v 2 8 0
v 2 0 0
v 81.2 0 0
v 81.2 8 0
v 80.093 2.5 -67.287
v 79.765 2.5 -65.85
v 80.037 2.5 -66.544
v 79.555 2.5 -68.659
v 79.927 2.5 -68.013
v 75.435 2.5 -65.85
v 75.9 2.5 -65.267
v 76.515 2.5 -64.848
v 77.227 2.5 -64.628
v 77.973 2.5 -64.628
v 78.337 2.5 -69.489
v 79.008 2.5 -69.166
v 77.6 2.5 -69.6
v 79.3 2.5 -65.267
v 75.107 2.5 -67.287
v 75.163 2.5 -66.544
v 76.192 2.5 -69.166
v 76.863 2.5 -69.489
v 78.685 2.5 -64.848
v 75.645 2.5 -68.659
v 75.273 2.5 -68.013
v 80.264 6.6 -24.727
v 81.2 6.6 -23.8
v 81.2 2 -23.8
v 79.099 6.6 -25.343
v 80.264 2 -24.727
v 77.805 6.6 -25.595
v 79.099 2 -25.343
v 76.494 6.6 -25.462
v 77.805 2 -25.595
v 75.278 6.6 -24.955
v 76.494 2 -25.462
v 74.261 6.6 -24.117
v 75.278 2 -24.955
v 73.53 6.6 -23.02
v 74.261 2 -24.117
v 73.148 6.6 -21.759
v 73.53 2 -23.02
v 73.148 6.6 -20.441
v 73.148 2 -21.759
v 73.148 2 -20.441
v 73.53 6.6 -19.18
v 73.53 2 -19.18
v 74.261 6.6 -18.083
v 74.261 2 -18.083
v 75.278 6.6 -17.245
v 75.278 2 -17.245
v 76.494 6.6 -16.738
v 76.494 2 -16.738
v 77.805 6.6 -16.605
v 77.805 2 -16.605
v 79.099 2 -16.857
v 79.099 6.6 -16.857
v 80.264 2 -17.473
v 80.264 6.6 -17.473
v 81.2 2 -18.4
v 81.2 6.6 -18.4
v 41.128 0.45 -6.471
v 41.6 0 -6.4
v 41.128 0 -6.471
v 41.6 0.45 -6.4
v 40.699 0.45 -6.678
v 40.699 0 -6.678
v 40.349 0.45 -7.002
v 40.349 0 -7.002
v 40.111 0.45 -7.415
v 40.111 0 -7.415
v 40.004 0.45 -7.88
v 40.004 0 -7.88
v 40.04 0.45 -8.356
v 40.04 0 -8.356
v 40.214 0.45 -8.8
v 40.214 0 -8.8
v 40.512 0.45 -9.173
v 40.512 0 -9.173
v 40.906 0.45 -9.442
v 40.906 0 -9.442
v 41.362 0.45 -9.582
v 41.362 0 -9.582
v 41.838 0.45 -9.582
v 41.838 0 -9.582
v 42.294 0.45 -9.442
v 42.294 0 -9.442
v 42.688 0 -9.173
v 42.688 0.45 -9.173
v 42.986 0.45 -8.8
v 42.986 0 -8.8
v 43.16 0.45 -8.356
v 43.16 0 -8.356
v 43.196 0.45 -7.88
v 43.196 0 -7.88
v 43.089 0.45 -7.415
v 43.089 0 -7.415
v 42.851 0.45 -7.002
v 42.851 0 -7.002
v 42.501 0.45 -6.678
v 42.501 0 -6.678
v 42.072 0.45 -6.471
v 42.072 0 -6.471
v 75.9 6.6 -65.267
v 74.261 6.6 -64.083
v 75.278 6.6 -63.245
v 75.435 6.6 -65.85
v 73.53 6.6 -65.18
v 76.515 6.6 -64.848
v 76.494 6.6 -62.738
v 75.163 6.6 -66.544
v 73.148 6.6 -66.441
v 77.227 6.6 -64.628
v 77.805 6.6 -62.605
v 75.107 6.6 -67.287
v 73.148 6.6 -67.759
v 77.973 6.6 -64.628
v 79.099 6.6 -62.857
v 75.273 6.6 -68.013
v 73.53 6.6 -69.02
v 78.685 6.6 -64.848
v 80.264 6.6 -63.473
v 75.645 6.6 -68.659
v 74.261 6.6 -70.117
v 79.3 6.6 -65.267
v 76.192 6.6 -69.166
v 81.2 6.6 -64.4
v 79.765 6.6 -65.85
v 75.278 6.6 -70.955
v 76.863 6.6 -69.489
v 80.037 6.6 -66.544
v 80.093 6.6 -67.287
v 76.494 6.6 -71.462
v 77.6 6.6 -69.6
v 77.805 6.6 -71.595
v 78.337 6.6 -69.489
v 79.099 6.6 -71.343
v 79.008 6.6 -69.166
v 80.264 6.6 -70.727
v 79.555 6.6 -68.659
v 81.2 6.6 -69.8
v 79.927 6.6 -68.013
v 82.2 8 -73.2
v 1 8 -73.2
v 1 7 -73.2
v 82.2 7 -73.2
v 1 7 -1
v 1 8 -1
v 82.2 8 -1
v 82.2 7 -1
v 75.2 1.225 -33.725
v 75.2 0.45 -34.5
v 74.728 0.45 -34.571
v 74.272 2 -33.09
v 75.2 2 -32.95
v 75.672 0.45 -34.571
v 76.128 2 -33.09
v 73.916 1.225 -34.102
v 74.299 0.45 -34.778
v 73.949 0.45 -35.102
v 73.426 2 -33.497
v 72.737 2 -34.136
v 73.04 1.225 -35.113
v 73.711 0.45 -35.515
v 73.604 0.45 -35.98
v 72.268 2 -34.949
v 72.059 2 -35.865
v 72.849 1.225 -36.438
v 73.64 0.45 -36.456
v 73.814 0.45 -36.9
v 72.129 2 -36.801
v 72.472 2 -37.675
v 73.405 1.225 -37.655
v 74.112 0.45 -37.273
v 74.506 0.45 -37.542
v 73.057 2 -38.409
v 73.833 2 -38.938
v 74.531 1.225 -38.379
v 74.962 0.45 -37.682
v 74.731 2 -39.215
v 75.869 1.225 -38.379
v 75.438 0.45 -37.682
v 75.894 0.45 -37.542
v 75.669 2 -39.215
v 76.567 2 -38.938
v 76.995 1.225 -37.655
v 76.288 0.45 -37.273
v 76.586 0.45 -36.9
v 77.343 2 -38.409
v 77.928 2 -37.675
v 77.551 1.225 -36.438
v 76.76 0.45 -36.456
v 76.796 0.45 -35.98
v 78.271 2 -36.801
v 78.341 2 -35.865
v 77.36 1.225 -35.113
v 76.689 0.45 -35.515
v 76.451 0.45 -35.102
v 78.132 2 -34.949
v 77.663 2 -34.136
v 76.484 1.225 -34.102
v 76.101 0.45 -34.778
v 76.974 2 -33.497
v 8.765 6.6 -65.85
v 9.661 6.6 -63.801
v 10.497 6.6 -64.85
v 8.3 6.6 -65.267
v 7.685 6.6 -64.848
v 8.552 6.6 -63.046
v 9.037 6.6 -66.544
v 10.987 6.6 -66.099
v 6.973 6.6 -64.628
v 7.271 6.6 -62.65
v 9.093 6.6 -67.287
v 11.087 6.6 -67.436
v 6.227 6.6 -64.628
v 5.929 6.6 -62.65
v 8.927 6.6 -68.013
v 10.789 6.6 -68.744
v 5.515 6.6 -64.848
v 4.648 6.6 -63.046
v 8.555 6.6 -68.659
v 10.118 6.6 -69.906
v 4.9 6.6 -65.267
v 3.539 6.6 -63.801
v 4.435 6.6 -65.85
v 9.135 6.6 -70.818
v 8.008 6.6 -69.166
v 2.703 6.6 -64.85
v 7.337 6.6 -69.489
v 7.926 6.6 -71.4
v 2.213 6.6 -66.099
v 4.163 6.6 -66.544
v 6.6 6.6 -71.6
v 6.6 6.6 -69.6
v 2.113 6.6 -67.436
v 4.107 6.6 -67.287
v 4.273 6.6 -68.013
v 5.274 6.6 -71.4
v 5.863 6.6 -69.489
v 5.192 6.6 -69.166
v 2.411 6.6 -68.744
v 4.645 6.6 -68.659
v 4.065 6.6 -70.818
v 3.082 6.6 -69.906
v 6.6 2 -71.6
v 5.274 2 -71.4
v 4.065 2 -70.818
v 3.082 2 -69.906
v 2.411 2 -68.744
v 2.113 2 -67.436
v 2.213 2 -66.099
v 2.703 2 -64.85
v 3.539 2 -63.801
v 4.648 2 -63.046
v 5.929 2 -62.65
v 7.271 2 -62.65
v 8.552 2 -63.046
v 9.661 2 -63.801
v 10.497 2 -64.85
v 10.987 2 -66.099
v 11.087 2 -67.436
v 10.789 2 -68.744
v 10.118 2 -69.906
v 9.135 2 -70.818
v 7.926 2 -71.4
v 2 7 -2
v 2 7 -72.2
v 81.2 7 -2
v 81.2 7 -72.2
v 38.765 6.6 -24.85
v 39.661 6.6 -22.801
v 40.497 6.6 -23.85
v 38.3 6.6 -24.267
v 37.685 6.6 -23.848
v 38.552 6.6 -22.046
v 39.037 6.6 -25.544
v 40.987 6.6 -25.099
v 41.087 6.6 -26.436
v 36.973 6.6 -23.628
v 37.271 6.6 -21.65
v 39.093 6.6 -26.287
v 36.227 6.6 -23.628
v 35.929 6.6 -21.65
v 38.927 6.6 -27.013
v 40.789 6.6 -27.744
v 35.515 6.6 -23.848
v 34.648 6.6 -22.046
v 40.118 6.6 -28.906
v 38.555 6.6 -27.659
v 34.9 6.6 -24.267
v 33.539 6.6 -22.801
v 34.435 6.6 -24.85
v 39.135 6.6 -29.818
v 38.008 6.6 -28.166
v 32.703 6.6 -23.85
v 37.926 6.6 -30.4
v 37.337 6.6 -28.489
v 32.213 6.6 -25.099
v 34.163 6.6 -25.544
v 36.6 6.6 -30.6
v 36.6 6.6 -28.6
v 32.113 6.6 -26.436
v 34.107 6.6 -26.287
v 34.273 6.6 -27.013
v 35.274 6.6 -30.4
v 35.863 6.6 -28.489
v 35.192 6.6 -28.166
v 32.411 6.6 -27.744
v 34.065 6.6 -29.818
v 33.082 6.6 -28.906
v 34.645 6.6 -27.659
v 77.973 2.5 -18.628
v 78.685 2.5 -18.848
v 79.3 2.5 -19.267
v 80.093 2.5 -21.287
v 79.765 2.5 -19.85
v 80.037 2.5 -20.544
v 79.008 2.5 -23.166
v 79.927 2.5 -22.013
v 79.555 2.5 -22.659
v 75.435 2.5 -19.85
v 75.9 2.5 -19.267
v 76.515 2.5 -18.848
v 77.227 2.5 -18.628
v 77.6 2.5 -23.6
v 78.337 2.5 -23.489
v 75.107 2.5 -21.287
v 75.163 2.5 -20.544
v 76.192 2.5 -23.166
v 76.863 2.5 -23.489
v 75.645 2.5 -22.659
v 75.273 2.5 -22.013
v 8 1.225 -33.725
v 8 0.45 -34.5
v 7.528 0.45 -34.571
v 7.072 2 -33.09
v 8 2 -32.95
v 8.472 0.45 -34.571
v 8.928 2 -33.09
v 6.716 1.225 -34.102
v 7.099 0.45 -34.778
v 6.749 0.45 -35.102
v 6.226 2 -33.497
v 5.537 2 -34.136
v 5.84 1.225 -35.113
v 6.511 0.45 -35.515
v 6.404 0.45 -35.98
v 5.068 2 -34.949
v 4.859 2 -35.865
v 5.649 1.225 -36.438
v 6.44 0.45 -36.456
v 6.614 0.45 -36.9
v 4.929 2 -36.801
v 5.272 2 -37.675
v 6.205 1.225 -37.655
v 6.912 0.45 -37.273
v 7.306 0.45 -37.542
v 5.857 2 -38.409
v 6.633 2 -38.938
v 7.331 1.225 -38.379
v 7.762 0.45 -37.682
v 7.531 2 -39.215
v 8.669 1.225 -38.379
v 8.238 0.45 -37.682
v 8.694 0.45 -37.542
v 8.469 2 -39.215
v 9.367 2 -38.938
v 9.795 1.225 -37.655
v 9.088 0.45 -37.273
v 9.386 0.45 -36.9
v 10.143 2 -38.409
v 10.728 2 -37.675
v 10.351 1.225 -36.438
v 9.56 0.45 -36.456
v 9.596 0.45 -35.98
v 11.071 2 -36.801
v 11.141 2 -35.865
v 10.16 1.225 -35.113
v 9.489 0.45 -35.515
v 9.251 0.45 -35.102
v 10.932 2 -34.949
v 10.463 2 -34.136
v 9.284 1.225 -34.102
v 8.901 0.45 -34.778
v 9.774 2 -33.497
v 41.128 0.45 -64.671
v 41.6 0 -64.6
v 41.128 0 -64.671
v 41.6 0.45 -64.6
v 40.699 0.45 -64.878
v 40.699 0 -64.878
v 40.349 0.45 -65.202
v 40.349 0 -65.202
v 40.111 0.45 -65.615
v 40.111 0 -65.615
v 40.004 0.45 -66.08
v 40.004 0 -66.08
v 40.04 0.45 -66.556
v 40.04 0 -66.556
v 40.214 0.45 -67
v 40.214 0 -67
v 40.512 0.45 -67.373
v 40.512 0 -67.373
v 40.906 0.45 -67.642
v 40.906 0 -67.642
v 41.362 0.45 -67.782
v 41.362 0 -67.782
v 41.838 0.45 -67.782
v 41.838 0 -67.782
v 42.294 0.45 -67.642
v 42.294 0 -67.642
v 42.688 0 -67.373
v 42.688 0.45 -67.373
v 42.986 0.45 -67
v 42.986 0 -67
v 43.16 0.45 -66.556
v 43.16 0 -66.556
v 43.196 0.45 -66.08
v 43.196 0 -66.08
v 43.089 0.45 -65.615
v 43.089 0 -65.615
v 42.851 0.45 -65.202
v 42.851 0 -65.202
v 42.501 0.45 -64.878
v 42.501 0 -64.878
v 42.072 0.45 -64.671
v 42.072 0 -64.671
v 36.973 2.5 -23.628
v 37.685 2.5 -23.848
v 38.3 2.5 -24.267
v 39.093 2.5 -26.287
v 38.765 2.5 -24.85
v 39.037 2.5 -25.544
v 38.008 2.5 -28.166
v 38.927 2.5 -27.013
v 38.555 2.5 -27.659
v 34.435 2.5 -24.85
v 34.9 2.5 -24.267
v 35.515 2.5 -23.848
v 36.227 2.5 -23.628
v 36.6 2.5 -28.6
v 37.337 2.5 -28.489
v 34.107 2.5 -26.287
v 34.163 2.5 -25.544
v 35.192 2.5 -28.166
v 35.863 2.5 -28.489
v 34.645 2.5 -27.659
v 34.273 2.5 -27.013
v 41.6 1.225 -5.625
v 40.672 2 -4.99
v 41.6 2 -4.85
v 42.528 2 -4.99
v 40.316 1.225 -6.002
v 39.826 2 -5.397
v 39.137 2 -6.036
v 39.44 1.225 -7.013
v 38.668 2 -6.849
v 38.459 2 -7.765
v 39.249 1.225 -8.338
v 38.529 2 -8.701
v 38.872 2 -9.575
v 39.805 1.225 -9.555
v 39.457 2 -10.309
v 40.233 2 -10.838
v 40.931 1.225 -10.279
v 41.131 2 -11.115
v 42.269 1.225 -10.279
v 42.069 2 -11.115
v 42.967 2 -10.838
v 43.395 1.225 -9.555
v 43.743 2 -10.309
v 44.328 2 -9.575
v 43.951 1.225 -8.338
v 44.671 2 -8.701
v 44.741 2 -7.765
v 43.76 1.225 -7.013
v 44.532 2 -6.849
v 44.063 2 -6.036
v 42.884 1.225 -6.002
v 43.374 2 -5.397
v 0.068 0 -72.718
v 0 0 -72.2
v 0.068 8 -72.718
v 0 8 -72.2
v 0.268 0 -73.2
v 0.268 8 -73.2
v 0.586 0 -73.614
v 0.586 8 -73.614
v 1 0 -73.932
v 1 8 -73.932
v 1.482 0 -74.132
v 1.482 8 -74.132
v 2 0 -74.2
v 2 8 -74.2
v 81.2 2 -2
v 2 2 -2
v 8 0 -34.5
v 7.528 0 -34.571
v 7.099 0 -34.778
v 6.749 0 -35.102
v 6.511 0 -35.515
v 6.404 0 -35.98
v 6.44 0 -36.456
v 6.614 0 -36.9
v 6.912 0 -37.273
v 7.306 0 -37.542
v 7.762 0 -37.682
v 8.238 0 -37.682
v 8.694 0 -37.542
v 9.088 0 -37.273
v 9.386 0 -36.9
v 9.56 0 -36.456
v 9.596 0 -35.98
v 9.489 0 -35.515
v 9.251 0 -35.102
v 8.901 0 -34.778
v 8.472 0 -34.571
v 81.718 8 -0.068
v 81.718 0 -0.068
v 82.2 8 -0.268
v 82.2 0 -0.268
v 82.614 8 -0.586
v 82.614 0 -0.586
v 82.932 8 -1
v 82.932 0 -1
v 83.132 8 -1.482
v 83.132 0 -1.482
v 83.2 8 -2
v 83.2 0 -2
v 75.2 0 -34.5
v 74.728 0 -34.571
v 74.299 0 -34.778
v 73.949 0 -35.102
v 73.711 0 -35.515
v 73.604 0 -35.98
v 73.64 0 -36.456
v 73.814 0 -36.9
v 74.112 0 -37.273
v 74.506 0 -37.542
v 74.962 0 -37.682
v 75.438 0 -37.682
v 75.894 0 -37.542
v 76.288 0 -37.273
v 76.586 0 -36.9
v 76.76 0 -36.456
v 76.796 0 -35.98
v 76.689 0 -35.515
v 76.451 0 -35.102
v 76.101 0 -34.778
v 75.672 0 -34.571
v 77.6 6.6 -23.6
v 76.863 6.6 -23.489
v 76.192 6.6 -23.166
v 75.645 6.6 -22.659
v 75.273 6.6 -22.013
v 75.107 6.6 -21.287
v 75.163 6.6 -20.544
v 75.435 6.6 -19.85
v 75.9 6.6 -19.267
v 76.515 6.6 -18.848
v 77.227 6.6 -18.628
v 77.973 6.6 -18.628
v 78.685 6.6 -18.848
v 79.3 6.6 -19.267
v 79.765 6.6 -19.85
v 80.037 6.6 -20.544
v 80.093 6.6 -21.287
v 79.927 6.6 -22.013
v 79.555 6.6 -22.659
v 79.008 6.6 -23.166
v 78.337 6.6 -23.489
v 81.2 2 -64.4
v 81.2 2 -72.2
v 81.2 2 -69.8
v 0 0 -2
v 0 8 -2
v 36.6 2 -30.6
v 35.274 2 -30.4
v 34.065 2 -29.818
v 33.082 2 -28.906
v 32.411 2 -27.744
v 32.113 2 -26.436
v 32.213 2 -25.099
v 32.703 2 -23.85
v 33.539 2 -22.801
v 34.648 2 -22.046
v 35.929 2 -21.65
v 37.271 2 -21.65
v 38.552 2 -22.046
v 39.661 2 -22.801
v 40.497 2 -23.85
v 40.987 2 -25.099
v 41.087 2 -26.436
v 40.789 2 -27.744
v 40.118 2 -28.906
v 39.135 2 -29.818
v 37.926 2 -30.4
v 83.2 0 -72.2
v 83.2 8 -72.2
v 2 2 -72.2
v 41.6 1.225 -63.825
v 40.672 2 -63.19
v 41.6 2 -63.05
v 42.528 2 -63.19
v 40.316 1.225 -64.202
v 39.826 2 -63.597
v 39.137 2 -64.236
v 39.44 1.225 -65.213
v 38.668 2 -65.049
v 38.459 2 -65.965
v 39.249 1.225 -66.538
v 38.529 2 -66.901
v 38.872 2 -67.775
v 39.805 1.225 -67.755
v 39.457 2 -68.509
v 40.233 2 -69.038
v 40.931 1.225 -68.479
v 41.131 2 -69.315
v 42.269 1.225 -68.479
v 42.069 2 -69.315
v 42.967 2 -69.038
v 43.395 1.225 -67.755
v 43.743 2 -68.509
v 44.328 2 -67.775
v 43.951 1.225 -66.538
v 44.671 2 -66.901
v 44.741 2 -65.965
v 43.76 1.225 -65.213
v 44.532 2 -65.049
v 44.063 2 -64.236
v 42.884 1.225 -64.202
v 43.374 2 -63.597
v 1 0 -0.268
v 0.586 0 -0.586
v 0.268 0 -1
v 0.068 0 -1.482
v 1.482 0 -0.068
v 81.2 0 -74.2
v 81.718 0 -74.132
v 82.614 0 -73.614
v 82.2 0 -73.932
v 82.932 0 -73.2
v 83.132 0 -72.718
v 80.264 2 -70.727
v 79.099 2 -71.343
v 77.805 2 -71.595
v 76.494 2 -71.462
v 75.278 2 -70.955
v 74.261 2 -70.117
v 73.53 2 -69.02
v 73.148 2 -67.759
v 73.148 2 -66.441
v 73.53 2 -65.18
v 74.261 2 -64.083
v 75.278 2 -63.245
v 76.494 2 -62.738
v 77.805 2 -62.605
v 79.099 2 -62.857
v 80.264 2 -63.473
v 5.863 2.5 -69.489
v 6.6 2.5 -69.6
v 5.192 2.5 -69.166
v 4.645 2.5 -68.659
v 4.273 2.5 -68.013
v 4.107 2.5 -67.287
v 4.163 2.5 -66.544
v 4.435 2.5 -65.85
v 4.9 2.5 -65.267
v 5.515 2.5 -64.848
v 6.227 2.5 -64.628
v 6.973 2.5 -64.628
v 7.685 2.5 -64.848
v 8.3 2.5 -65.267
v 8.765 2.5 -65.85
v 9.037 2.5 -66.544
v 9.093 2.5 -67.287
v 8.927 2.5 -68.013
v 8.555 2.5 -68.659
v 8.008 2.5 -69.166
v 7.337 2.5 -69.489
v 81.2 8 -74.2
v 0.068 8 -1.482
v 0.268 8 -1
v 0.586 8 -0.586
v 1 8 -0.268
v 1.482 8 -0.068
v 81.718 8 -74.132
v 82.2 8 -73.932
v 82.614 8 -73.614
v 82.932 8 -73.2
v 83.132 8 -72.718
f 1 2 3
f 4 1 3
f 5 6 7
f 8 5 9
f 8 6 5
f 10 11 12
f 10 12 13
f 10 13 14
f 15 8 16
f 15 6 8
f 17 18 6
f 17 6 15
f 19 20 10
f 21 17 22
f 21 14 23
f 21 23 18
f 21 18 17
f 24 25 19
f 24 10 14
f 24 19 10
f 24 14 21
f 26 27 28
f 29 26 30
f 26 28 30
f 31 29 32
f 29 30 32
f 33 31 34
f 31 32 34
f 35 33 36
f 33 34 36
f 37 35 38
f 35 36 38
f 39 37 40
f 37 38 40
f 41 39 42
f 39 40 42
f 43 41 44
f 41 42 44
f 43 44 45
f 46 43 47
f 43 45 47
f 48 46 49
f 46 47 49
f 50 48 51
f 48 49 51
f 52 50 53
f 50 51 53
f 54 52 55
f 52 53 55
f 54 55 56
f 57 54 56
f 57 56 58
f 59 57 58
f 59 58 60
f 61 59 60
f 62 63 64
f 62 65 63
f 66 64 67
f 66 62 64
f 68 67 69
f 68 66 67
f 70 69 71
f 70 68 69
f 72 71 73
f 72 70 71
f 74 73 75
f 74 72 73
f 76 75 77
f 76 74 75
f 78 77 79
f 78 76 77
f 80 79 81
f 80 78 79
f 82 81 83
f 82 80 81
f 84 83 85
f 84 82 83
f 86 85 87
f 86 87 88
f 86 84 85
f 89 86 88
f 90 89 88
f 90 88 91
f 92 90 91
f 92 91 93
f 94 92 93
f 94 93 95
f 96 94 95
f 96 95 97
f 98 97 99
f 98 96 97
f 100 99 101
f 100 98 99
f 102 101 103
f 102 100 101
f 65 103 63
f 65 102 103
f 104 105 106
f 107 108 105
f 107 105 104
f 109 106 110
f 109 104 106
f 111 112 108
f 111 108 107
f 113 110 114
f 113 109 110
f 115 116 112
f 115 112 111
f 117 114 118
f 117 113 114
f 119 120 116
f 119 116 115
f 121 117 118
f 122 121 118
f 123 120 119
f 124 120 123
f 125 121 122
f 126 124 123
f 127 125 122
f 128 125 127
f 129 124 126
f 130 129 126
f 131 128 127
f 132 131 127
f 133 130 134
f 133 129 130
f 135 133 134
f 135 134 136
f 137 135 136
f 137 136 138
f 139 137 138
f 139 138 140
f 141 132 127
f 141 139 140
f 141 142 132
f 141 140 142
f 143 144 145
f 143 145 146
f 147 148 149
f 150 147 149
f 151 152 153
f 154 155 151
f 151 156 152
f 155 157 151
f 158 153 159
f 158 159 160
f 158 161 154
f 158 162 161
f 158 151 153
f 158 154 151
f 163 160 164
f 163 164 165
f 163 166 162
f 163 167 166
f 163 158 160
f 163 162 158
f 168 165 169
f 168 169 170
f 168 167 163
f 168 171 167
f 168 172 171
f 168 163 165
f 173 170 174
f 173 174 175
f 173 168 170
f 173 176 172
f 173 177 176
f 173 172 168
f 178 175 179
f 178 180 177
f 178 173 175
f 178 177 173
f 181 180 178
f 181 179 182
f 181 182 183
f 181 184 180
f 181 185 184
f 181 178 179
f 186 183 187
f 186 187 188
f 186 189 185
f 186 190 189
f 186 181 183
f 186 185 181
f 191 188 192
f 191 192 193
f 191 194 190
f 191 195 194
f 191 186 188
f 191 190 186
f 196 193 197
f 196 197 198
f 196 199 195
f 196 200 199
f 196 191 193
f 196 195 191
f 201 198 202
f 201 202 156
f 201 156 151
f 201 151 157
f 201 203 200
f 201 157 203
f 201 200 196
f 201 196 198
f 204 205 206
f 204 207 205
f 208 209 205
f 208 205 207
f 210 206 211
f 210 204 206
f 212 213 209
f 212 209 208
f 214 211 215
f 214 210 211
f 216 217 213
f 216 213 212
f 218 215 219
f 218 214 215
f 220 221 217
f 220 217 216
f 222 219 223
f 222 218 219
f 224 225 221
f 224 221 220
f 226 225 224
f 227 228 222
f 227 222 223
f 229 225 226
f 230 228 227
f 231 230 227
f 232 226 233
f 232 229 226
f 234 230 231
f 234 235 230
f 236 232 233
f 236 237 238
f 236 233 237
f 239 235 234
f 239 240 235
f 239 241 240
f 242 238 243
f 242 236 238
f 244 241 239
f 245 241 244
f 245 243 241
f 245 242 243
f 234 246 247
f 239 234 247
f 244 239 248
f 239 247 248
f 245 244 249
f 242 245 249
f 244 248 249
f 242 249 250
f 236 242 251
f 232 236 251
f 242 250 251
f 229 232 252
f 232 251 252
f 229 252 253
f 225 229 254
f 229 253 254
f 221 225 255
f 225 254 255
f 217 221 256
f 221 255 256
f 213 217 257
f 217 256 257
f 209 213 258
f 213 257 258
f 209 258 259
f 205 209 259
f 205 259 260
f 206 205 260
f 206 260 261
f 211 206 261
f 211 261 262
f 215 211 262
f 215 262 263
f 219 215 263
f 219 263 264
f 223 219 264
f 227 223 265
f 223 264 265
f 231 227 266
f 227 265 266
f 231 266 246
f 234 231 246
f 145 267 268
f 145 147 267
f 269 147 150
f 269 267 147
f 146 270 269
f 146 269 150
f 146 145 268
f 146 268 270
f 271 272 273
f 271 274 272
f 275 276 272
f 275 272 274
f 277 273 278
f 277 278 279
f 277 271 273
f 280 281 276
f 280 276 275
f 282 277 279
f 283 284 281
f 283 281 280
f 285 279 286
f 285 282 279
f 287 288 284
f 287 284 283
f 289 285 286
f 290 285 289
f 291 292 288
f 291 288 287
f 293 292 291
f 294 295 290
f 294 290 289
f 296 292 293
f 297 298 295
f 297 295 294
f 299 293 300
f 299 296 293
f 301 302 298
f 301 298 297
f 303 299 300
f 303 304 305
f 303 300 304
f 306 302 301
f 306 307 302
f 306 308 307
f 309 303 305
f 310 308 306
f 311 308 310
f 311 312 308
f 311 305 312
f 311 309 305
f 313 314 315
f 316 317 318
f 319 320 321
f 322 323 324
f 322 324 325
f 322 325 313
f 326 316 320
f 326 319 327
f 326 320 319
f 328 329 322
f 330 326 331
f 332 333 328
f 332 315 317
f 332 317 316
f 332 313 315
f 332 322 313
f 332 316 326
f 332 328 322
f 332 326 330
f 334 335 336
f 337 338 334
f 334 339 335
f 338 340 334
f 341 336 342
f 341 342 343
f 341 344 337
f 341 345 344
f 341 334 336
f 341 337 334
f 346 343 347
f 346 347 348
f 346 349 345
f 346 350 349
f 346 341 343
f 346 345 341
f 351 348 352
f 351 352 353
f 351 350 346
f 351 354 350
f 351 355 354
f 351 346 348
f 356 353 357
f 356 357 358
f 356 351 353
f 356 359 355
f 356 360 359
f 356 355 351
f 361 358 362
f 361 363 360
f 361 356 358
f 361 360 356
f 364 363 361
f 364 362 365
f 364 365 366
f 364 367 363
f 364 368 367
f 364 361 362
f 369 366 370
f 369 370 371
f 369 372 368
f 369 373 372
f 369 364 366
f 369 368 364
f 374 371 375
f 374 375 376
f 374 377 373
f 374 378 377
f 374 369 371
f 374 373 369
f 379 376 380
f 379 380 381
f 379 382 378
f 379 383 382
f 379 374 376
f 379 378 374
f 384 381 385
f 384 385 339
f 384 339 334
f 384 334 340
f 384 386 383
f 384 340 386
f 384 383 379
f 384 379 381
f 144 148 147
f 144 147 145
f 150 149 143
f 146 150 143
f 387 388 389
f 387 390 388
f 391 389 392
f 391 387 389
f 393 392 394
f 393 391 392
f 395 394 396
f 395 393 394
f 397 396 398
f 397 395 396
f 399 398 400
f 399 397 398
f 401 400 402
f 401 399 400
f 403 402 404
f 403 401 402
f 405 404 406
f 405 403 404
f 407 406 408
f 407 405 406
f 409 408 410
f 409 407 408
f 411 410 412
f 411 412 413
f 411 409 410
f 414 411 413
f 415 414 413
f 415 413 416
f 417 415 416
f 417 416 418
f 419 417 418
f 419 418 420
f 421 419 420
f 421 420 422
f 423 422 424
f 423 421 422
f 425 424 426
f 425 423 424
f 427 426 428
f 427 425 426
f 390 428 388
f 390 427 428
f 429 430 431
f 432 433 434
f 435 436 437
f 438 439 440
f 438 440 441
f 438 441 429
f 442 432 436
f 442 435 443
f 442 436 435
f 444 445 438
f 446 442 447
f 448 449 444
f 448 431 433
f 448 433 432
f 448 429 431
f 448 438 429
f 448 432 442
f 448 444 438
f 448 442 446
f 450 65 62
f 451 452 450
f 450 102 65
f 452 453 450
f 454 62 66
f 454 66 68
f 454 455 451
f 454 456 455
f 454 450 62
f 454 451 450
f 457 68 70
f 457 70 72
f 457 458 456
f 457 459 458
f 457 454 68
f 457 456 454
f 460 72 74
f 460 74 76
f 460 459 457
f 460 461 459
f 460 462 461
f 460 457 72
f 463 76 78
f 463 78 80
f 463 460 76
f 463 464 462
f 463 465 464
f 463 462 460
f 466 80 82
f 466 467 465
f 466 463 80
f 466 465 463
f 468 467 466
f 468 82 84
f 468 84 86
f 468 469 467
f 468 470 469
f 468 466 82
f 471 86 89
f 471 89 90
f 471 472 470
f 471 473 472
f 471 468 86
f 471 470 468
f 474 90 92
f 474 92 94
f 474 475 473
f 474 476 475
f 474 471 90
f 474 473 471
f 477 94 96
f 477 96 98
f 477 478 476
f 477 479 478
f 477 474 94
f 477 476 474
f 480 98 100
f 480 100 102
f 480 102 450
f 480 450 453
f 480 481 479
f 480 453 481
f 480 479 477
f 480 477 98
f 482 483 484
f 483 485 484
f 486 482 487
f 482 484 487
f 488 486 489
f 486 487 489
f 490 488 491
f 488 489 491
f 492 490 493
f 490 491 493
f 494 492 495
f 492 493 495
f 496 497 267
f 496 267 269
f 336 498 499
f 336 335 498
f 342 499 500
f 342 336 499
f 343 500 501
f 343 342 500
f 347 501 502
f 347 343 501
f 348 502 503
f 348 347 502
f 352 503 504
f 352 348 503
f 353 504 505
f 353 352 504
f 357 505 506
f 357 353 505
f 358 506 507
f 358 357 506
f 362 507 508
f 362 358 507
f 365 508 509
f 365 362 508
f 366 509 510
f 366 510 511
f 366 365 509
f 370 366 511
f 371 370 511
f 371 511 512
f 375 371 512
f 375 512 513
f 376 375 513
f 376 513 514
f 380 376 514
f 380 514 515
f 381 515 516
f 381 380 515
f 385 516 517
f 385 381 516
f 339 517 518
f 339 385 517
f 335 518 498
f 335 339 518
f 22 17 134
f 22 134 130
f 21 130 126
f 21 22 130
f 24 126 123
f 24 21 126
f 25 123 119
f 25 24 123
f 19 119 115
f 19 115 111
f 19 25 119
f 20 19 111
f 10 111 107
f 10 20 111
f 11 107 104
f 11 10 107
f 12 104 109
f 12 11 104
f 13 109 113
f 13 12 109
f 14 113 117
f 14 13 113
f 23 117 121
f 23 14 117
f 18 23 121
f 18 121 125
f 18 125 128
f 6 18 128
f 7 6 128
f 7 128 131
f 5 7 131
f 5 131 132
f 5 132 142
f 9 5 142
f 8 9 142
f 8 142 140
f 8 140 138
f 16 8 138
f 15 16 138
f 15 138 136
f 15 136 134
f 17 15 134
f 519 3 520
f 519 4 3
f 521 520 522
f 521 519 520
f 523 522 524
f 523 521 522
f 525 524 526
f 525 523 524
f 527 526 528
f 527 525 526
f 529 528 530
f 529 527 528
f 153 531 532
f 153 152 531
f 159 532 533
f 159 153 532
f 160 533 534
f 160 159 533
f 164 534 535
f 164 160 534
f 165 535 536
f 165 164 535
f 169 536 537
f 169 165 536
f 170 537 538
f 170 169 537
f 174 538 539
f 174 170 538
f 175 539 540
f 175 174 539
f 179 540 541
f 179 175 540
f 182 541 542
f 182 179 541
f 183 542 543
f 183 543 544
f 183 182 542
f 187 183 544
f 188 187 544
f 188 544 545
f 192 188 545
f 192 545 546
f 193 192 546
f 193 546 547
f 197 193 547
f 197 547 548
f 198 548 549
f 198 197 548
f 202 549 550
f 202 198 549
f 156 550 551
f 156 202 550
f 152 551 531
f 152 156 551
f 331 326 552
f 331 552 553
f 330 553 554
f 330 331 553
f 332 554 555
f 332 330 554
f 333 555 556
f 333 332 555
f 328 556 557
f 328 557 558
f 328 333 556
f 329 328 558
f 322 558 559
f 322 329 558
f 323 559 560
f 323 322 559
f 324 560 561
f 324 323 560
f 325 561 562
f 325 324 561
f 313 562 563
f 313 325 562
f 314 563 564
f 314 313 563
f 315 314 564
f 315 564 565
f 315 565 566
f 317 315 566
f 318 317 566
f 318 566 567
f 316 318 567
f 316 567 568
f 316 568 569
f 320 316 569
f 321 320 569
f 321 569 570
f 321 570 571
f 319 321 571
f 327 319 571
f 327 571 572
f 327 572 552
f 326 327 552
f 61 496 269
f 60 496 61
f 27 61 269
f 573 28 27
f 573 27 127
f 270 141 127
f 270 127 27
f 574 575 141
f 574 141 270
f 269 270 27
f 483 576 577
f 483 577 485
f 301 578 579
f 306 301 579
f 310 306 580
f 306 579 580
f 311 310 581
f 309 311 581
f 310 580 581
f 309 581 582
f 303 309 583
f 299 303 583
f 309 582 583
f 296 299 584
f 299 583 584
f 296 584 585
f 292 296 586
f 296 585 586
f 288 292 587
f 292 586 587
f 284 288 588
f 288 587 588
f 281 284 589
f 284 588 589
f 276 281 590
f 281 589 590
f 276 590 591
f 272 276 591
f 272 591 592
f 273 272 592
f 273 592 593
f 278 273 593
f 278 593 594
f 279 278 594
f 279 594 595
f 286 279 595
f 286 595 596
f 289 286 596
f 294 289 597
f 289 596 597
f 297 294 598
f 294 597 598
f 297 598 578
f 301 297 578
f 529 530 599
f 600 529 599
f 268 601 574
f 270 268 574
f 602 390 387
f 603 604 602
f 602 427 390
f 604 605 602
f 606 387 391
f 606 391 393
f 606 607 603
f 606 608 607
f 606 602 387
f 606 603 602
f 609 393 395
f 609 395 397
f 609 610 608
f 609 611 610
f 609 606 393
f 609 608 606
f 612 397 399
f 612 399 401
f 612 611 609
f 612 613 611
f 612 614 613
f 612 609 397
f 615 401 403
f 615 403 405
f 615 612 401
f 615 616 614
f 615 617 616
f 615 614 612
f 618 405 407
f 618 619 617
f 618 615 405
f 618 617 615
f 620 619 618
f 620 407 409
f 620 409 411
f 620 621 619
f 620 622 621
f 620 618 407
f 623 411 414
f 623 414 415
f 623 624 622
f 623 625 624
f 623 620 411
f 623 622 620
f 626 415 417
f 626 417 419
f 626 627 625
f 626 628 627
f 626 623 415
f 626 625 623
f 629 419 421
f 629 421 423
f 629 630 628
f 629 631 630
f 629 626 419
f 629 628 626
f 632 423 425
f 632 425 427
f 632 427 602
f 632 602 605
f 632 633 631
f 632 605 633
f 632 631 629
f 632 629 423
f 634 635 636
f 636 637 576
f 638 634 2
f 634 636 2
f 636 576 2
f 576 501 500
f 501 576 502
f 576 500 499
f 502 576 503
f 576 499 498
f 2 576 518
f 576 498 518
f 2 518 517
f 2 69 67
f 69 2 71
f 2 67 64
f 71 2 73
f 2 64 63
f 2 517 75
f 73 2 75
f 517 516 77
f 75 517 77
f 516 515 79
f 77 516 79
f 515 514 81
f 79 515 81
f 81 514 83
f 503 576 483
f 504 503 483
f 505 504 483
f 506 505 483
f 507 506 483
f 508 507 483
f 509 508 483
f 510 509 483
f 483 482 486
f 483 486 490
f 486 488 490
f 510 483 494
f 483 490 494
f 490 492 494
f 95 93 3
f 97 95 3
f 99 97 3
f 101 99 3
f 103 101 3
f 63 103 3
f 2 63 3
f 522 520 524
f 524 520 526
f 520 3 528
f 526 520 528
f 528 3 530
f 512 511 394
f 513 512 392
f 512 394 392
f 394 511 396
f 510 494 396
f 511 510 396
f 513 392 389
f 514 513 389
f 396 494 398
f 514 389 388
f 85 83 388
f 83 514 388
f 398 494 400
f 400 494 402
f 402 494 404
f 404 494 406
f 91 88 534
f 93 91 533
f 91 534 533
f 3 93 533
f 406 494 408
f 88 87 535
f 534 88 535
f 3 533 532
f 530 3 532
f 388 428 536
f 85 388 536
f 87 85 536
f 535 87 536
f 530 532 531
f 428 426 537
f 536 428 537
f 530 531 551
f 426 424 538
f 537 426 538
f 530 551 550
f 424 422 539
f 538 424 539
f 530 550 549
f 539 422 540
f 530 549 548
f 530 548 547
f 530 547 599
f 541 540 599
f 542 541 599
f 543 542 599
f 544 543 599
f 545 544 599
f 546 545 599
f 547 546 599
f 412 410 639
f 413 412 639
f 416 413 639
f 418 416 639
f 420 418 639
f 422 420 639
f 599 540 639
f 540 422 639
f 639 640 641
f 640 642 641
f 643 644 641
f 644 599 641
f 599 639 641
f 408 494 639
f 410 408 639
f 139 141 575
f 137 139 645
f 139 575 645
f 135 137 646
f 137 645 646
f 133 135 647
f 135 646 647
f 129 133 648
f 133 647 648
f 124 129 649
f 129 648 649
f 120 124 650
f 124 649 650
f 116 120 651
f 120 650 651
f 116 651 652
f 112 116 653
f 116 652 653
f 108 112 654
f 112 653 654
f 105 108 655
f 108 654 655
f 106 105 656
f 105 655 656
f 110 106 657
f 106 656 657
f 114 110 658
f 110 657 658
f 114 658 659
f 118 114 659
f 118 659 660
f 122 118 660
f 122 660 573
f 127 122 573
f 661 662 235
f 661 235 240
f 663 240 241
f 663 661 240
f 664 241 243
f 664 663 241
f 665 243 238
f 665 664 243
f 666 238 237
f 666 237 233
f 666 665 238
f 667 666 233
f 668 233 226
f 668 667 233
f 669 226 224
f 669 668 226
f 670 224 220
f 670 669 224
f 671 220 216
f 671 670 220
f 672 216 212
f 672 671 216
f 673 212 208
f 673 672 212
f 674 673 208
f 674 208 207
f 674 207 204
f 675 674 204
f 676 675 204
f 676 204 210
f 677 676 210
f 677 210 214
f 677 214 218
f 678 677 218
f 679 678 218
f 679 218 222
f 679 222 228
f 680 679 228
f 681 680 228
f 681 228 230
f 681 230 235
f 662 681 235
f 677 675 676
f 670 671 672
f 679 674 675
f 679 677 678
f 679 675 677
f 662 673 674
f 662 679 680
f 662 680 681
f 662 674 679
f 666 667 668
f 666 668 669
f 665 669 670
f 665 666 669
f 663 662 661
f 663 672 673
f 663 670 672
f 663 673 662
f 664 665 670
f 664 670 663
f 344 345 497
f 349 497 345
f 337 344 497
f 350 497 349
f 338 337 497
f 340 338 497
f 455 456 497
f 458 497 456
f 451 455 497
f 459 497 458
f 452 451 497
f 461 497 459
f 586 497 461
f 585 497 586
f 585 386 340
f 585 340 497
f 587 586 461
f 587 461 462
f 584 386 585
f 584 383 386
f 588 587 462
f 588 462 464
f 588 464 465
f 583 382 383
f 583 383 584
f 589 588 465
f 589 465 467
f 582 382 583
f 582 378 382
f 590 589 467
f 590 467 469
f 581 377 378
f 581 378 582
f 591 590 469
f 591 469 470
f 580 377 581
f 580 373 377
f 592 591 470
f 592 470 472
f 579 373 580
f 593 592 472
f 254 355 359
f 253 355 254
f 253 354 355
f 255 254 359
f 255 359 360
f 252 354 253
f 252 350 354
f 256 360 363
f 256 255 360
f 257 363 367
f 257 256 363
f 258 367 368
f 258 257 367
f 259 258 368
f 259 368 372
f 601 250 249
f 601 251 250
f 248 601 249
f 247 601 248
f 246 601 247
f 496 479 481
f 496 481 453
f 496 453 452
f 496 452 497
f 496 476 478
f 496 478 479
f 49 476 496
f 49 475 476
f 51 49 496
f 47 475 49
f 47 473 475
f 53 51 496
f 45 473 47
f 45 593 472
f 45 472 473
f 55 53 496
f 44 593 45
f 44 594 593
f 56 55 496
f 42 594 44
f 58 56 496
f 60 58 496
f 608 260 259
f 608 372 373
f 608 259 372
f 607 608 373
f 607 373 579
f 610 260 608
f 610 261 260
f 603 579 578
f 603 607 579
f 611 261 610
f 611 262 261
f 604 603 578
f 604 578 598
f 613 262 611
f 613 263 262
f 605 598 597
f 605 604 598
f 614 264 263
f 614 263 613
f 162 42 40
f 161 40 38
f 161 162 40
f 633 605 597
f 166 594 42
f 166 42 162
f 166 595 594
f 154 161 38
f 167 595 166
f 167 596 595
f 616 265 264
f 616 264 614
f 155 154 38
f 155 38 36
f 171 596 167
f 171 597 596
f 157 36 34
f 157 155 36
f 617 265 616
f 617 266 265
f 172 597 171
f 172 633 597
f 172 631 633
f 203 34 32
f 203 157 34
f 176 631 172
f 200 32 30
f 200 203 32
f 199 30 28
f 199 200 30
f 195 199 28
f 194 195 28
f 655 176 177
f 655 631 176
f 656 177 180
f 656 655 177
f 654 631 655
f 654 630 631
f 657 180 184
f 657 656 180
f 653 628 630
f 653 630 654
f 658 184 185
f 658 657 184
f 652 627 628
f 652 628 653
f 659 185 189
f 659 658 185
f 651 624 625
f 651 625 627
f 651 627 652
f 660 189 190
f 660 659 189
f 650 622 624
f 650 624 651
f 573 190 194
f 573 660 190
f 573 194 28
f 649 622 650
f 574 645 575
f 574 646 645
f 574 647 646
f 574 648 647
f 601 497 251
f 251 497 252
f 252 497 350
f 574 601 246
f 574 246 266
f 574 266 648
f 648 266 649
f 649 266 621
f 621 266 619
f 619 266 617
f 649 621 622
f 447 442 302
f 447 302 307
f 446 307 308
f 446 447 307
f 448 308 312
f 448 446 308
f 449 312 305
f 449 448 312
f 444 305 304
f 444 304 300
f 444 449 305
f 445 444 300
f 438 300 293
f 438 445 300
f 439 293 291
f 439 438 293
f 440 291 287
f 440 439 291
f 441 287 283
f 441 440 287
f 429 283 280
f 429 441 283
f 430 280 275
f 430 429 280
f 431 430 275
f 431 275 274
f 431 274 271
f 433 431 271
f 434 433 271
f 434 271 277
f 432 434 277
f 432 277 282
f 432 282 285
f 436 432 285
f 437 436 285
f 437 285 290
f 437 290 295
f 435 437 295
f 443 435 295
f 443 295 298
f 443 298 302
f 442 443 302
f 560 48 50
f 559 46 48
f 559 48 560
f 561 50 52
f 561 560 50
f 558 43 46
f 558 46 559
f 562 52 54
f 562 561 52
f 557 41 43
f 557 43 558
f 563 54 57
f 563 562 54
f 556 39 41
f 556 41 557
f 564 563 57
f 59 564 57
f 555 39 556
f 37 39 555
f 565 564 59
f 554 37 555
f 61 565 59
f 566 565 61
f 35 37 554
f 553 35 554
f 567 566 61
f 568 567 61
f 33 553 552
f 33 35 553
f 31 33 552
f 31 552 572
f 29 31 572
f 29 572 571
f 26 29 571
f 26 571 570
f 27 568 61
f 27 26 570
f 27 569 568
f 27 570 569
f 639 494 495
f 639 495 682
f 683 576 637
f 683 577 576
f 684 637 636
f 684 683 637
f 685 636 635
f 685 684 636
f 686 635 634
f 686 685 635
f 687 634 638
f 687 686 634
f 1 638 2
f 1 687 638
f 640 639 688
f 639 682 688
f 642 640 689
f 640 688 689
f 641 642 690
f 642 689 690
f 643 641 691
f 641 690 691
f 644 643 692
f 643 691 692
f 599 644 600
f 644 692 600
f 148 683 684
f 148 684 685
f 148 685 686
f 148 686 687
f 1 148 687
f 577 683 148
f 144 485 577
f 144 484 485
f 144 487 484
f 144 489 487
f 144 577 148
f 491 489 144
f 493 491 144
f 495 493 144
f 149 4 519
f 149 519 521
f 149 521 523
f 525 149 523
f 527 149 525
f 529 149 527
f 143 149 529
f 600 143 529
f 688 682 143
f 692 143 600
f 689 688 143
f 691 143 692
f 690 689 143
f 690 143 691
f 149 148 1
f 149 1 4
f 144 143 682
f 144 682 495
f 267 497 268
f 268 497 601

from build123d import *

# Parameters (mm, degrees)
SKETCH1_W                                      = 83.2
SKETCH1_H                                      = 74.2
BOSS_EXTRUDE1_DEPTH                            = 8
SHELL1_T                                       = -2
SKETCH2_R                                      = 4.5
SKETCH2_R_2                                    = 2.5
BOSS_EXTRUDE2_DEPTH                            = 4.6
SKETCH3_W                                      = 81.2
SKETCH3_H                                      = 72.2
CUT_EXTRUDE1_DEPTH                             = 1
SKETCH4_R                                      = 2.5
BOSS_EXTRUDE3_DEPTH                            = 0.5
CSK_FOR_M3_FLAT_HEAD_MACHINE_SCREW1_AT_2_COUNT = 2
CSK_FOR_M3_FLAT_HEAD_MACHINE_SCREW1_AT_2_PITCH = 45.11064176
CSK_FOR_M3_FLAT_HEAD_MACHINE_SCREW1_AT_3_COUNT = 2
CSK_FOR_M3_FLAT_HEAD_MACHINE_SCREW1_AT_3_PITCH = 45.11064176
CSK_FOR_M3_FLAT_HEAD_MACHINE_SCREW1_AT_4_COUNT = 2
CSK_FOR_M3_FLAT_HEAD_MACHINE_SCREW1_AT_4_PITCH = 58.2
FILLET1_R                                      = 2


with BuildPart() as part:
    # Sketch1 → Boss-Extrude1 (new body)
    with BuildSketch(Plane(origin=(0, 0, 0), x_dir=(1, 0, 0), z_dir=(0, 1, 0))):
        with Locations((41.6, 37.1)):
            Rectangle(SKETCH1_W, SKETCH1_H)
    extrude(amount=BOSS_EXTRUDE1_DEPTH)

    # Shell1
    shell1_openings = [part.faces().sort_by_distance(p)[0] for p in [
        (41.6, 8, -37.1),
    ]]
    offset(amount=SHELL1_T, openings=shell1_openings, kind=Kind.INTERSECTION)

    # Sketch2 → Boss-Extrude2 (add)
    # profile 1 of 4: a face of its own
    with BuildSketch(Plane(origin=(0, 2, 0), x_dir=(1, 0, 0), z_dir=(0, 1, 0))):
        with Locations(Location((6.6, 67.1, 0), (0, 0, 90))):
            Circle(SKETCH2_R)
        with Locations(Location((6.6, 67.1, 0), (0, 0, 90))):
            Circle(SKETCH2_R_2, mode=Mode.SUBTRACT)
    # profile 2 of 4: a face of its own
    with BuildSketch(Plane(origin=(0, 2, 0), x_dir=(1, 0, 0), z_dir=(0, 1, 0))):
        with Locations(Location((36.6, 26.1, 0), (0, 0, 90))):
            Circle(SKETCH2_R)
        with Locations(Location((36.6, 26.1, 0), (0, 0, 90))):
            Circle(SKETCH2_R_2, mode=Mode.SUBTRACT)
    # profile 3 of 4: a face of its own
    with BuildSketch(Plane(origin=(0, 2, 0), x_dir=(1, 0, 0), z_dir=(0, 1, 0))):
        with Locations((77.6, 67.1)):
            Circle(SKETCH2_R)
        with Locations(Location((77.6, 67.1, 0), (0, 0, 90))):
            Circle(SKETCH2_R_2, mode=Mode.SUBTRACT)
    # profile 4 of 4: a face of its own
    with BuildSketch(Plane(origin=(0, 2, 0), x_dir=(1, 0, 0), z_dir=(0, 1, 0))):
        with Locations((77.6, 21.1)):
            Circle(SKETCH2_R)
        with Locations(Location((77.6, 21.1, 0), (0, 0, 90))):
            Circle(SKETCH2_R_2, mode=Mode.SUBTRACT)
    extrude(amount=BOSS_EXTRUDE2_DEPTH)

    # Sketch3 → Cut-Extrude1 (cut)
    with BuildSketch(Plane(origin=(0, 8, 0), x_dir=(1, 0, 0), z_dir=(0, 1, 0))):
        with Locations((41.6, 37.1)):
            Rectangle(SKETCH3_W, SKETCH3_H)
    extrude(amount=-CUT_EXTRUDE1_DEPTH, mode=Mode.SUBTRACT)

    # Sketch4 → Boss-Extrude3 (add)
    with BuildSketch(Plane(origin=(0, 2, 0), x_dir=(1, 0, 0), z_dir=(0, 1, 0))):
        with Locations(Location((6.6, 67.1, 0), (0, 0, 90))):
            Circle(SKETCH4_R)
        with Locations(Location((77.6, 67.1, 0), (0, 0, 90))):
            Circle(SKETCH4_R)
        with Locations(Location((36.6, 26.1, 0), (0, 0, 90))):
            Circle(SKETCH4_R)
        with Locations(Location((77.6, 21.1, 0), (0, 0, 90))):
            Circle(SKETCH4_R)
    extrude(amount=BOSS_EXTRUDE3_DEPTH)

    # Sketch6 → CSK for M3 Flat Head Machine Screw1 (revolve, cut)
    with BuildSketch(Plane(origin=(41.6, 2, -66.2), x_dir=(0, 0, 1), z_dir=(1, 0, 0))):
        Polygon((0, 0), (0, 2), (1.6, 2), (1.6, 1.55), (3.15, 0), align=None)
    csk_for_m3_flat_head_machine_screw1 = revolve(axis=Axis((41.6, 8.35, -66.2), (0, -1, 0)), mode=Mode.SUBTRACT)

    # CSK for M3 Flat Head Machine Screw1 at 2: CSK for M3 Flat Head Machine Screw1 ×2
    with Locations(*[Vector(-0.7448353357230582, 0, 0.6672483215852396) * (i * CSK_FOR_M3_FLAT_HEAD_MACHINE_SCREW1_AT_2_PITCH) for i in range(1, CSK_FOR_M3_FLAT_HEAD_MACHINE_SCREW1_AT_2_COUNT)]):
        add(csk_for_m3_flat_head_machine_screw1, mode=Mode.SUBTRACT)

    # CSK for M3 Flat Head Machine Screw1 at 3: CSK for M3 Flat Head Machine Screw1 ×2
    with Locations(*[Vector(0.7448353357230579, 0, 0.6672483215852397) * (i * CSK_FOR_M3_FLAT_HEAD_MACHINE_SCREW1_AT_3_PITCH) for i in range(1, CSK_FOR_M3_FLAT_HEAD_MACHINE_SCREW1_AT_3_COUNT)]):
        add(csk_for_m3_flat_head_machine_screw1, mode=Mode.SUBTRACT)

    # CSK for M3 Flat Head Machine Screw1 at 4: CSK for M3 Flat Head Machine Screw1 ×2
    with Locations(*[(0, 0, i * CSK_FOR_M3_FLAT_HEAD_MACHINE_SCREW1_AT_4_PITCH) for i in range(1, CSK_FOR_M3_FLAT_HEAD_MACHINE_SCREW1_AT_4_COUNT)]):
        add(csk_for_m3_flat_head_machine_screw1, mode=Mode.SUBTRACT)

    # Fillet1
    fillet1_edges = [part.edges().sort_by_distance(p)[0] for p in [
        (0, 4, -74.2),
        (83.2, 4, -74.2),
        (83.2, 4, 0),
        (0, 4, 0),
    ]]
    fillet(fillet1_edges, radius=FILLET1_R)


solid = part.part
